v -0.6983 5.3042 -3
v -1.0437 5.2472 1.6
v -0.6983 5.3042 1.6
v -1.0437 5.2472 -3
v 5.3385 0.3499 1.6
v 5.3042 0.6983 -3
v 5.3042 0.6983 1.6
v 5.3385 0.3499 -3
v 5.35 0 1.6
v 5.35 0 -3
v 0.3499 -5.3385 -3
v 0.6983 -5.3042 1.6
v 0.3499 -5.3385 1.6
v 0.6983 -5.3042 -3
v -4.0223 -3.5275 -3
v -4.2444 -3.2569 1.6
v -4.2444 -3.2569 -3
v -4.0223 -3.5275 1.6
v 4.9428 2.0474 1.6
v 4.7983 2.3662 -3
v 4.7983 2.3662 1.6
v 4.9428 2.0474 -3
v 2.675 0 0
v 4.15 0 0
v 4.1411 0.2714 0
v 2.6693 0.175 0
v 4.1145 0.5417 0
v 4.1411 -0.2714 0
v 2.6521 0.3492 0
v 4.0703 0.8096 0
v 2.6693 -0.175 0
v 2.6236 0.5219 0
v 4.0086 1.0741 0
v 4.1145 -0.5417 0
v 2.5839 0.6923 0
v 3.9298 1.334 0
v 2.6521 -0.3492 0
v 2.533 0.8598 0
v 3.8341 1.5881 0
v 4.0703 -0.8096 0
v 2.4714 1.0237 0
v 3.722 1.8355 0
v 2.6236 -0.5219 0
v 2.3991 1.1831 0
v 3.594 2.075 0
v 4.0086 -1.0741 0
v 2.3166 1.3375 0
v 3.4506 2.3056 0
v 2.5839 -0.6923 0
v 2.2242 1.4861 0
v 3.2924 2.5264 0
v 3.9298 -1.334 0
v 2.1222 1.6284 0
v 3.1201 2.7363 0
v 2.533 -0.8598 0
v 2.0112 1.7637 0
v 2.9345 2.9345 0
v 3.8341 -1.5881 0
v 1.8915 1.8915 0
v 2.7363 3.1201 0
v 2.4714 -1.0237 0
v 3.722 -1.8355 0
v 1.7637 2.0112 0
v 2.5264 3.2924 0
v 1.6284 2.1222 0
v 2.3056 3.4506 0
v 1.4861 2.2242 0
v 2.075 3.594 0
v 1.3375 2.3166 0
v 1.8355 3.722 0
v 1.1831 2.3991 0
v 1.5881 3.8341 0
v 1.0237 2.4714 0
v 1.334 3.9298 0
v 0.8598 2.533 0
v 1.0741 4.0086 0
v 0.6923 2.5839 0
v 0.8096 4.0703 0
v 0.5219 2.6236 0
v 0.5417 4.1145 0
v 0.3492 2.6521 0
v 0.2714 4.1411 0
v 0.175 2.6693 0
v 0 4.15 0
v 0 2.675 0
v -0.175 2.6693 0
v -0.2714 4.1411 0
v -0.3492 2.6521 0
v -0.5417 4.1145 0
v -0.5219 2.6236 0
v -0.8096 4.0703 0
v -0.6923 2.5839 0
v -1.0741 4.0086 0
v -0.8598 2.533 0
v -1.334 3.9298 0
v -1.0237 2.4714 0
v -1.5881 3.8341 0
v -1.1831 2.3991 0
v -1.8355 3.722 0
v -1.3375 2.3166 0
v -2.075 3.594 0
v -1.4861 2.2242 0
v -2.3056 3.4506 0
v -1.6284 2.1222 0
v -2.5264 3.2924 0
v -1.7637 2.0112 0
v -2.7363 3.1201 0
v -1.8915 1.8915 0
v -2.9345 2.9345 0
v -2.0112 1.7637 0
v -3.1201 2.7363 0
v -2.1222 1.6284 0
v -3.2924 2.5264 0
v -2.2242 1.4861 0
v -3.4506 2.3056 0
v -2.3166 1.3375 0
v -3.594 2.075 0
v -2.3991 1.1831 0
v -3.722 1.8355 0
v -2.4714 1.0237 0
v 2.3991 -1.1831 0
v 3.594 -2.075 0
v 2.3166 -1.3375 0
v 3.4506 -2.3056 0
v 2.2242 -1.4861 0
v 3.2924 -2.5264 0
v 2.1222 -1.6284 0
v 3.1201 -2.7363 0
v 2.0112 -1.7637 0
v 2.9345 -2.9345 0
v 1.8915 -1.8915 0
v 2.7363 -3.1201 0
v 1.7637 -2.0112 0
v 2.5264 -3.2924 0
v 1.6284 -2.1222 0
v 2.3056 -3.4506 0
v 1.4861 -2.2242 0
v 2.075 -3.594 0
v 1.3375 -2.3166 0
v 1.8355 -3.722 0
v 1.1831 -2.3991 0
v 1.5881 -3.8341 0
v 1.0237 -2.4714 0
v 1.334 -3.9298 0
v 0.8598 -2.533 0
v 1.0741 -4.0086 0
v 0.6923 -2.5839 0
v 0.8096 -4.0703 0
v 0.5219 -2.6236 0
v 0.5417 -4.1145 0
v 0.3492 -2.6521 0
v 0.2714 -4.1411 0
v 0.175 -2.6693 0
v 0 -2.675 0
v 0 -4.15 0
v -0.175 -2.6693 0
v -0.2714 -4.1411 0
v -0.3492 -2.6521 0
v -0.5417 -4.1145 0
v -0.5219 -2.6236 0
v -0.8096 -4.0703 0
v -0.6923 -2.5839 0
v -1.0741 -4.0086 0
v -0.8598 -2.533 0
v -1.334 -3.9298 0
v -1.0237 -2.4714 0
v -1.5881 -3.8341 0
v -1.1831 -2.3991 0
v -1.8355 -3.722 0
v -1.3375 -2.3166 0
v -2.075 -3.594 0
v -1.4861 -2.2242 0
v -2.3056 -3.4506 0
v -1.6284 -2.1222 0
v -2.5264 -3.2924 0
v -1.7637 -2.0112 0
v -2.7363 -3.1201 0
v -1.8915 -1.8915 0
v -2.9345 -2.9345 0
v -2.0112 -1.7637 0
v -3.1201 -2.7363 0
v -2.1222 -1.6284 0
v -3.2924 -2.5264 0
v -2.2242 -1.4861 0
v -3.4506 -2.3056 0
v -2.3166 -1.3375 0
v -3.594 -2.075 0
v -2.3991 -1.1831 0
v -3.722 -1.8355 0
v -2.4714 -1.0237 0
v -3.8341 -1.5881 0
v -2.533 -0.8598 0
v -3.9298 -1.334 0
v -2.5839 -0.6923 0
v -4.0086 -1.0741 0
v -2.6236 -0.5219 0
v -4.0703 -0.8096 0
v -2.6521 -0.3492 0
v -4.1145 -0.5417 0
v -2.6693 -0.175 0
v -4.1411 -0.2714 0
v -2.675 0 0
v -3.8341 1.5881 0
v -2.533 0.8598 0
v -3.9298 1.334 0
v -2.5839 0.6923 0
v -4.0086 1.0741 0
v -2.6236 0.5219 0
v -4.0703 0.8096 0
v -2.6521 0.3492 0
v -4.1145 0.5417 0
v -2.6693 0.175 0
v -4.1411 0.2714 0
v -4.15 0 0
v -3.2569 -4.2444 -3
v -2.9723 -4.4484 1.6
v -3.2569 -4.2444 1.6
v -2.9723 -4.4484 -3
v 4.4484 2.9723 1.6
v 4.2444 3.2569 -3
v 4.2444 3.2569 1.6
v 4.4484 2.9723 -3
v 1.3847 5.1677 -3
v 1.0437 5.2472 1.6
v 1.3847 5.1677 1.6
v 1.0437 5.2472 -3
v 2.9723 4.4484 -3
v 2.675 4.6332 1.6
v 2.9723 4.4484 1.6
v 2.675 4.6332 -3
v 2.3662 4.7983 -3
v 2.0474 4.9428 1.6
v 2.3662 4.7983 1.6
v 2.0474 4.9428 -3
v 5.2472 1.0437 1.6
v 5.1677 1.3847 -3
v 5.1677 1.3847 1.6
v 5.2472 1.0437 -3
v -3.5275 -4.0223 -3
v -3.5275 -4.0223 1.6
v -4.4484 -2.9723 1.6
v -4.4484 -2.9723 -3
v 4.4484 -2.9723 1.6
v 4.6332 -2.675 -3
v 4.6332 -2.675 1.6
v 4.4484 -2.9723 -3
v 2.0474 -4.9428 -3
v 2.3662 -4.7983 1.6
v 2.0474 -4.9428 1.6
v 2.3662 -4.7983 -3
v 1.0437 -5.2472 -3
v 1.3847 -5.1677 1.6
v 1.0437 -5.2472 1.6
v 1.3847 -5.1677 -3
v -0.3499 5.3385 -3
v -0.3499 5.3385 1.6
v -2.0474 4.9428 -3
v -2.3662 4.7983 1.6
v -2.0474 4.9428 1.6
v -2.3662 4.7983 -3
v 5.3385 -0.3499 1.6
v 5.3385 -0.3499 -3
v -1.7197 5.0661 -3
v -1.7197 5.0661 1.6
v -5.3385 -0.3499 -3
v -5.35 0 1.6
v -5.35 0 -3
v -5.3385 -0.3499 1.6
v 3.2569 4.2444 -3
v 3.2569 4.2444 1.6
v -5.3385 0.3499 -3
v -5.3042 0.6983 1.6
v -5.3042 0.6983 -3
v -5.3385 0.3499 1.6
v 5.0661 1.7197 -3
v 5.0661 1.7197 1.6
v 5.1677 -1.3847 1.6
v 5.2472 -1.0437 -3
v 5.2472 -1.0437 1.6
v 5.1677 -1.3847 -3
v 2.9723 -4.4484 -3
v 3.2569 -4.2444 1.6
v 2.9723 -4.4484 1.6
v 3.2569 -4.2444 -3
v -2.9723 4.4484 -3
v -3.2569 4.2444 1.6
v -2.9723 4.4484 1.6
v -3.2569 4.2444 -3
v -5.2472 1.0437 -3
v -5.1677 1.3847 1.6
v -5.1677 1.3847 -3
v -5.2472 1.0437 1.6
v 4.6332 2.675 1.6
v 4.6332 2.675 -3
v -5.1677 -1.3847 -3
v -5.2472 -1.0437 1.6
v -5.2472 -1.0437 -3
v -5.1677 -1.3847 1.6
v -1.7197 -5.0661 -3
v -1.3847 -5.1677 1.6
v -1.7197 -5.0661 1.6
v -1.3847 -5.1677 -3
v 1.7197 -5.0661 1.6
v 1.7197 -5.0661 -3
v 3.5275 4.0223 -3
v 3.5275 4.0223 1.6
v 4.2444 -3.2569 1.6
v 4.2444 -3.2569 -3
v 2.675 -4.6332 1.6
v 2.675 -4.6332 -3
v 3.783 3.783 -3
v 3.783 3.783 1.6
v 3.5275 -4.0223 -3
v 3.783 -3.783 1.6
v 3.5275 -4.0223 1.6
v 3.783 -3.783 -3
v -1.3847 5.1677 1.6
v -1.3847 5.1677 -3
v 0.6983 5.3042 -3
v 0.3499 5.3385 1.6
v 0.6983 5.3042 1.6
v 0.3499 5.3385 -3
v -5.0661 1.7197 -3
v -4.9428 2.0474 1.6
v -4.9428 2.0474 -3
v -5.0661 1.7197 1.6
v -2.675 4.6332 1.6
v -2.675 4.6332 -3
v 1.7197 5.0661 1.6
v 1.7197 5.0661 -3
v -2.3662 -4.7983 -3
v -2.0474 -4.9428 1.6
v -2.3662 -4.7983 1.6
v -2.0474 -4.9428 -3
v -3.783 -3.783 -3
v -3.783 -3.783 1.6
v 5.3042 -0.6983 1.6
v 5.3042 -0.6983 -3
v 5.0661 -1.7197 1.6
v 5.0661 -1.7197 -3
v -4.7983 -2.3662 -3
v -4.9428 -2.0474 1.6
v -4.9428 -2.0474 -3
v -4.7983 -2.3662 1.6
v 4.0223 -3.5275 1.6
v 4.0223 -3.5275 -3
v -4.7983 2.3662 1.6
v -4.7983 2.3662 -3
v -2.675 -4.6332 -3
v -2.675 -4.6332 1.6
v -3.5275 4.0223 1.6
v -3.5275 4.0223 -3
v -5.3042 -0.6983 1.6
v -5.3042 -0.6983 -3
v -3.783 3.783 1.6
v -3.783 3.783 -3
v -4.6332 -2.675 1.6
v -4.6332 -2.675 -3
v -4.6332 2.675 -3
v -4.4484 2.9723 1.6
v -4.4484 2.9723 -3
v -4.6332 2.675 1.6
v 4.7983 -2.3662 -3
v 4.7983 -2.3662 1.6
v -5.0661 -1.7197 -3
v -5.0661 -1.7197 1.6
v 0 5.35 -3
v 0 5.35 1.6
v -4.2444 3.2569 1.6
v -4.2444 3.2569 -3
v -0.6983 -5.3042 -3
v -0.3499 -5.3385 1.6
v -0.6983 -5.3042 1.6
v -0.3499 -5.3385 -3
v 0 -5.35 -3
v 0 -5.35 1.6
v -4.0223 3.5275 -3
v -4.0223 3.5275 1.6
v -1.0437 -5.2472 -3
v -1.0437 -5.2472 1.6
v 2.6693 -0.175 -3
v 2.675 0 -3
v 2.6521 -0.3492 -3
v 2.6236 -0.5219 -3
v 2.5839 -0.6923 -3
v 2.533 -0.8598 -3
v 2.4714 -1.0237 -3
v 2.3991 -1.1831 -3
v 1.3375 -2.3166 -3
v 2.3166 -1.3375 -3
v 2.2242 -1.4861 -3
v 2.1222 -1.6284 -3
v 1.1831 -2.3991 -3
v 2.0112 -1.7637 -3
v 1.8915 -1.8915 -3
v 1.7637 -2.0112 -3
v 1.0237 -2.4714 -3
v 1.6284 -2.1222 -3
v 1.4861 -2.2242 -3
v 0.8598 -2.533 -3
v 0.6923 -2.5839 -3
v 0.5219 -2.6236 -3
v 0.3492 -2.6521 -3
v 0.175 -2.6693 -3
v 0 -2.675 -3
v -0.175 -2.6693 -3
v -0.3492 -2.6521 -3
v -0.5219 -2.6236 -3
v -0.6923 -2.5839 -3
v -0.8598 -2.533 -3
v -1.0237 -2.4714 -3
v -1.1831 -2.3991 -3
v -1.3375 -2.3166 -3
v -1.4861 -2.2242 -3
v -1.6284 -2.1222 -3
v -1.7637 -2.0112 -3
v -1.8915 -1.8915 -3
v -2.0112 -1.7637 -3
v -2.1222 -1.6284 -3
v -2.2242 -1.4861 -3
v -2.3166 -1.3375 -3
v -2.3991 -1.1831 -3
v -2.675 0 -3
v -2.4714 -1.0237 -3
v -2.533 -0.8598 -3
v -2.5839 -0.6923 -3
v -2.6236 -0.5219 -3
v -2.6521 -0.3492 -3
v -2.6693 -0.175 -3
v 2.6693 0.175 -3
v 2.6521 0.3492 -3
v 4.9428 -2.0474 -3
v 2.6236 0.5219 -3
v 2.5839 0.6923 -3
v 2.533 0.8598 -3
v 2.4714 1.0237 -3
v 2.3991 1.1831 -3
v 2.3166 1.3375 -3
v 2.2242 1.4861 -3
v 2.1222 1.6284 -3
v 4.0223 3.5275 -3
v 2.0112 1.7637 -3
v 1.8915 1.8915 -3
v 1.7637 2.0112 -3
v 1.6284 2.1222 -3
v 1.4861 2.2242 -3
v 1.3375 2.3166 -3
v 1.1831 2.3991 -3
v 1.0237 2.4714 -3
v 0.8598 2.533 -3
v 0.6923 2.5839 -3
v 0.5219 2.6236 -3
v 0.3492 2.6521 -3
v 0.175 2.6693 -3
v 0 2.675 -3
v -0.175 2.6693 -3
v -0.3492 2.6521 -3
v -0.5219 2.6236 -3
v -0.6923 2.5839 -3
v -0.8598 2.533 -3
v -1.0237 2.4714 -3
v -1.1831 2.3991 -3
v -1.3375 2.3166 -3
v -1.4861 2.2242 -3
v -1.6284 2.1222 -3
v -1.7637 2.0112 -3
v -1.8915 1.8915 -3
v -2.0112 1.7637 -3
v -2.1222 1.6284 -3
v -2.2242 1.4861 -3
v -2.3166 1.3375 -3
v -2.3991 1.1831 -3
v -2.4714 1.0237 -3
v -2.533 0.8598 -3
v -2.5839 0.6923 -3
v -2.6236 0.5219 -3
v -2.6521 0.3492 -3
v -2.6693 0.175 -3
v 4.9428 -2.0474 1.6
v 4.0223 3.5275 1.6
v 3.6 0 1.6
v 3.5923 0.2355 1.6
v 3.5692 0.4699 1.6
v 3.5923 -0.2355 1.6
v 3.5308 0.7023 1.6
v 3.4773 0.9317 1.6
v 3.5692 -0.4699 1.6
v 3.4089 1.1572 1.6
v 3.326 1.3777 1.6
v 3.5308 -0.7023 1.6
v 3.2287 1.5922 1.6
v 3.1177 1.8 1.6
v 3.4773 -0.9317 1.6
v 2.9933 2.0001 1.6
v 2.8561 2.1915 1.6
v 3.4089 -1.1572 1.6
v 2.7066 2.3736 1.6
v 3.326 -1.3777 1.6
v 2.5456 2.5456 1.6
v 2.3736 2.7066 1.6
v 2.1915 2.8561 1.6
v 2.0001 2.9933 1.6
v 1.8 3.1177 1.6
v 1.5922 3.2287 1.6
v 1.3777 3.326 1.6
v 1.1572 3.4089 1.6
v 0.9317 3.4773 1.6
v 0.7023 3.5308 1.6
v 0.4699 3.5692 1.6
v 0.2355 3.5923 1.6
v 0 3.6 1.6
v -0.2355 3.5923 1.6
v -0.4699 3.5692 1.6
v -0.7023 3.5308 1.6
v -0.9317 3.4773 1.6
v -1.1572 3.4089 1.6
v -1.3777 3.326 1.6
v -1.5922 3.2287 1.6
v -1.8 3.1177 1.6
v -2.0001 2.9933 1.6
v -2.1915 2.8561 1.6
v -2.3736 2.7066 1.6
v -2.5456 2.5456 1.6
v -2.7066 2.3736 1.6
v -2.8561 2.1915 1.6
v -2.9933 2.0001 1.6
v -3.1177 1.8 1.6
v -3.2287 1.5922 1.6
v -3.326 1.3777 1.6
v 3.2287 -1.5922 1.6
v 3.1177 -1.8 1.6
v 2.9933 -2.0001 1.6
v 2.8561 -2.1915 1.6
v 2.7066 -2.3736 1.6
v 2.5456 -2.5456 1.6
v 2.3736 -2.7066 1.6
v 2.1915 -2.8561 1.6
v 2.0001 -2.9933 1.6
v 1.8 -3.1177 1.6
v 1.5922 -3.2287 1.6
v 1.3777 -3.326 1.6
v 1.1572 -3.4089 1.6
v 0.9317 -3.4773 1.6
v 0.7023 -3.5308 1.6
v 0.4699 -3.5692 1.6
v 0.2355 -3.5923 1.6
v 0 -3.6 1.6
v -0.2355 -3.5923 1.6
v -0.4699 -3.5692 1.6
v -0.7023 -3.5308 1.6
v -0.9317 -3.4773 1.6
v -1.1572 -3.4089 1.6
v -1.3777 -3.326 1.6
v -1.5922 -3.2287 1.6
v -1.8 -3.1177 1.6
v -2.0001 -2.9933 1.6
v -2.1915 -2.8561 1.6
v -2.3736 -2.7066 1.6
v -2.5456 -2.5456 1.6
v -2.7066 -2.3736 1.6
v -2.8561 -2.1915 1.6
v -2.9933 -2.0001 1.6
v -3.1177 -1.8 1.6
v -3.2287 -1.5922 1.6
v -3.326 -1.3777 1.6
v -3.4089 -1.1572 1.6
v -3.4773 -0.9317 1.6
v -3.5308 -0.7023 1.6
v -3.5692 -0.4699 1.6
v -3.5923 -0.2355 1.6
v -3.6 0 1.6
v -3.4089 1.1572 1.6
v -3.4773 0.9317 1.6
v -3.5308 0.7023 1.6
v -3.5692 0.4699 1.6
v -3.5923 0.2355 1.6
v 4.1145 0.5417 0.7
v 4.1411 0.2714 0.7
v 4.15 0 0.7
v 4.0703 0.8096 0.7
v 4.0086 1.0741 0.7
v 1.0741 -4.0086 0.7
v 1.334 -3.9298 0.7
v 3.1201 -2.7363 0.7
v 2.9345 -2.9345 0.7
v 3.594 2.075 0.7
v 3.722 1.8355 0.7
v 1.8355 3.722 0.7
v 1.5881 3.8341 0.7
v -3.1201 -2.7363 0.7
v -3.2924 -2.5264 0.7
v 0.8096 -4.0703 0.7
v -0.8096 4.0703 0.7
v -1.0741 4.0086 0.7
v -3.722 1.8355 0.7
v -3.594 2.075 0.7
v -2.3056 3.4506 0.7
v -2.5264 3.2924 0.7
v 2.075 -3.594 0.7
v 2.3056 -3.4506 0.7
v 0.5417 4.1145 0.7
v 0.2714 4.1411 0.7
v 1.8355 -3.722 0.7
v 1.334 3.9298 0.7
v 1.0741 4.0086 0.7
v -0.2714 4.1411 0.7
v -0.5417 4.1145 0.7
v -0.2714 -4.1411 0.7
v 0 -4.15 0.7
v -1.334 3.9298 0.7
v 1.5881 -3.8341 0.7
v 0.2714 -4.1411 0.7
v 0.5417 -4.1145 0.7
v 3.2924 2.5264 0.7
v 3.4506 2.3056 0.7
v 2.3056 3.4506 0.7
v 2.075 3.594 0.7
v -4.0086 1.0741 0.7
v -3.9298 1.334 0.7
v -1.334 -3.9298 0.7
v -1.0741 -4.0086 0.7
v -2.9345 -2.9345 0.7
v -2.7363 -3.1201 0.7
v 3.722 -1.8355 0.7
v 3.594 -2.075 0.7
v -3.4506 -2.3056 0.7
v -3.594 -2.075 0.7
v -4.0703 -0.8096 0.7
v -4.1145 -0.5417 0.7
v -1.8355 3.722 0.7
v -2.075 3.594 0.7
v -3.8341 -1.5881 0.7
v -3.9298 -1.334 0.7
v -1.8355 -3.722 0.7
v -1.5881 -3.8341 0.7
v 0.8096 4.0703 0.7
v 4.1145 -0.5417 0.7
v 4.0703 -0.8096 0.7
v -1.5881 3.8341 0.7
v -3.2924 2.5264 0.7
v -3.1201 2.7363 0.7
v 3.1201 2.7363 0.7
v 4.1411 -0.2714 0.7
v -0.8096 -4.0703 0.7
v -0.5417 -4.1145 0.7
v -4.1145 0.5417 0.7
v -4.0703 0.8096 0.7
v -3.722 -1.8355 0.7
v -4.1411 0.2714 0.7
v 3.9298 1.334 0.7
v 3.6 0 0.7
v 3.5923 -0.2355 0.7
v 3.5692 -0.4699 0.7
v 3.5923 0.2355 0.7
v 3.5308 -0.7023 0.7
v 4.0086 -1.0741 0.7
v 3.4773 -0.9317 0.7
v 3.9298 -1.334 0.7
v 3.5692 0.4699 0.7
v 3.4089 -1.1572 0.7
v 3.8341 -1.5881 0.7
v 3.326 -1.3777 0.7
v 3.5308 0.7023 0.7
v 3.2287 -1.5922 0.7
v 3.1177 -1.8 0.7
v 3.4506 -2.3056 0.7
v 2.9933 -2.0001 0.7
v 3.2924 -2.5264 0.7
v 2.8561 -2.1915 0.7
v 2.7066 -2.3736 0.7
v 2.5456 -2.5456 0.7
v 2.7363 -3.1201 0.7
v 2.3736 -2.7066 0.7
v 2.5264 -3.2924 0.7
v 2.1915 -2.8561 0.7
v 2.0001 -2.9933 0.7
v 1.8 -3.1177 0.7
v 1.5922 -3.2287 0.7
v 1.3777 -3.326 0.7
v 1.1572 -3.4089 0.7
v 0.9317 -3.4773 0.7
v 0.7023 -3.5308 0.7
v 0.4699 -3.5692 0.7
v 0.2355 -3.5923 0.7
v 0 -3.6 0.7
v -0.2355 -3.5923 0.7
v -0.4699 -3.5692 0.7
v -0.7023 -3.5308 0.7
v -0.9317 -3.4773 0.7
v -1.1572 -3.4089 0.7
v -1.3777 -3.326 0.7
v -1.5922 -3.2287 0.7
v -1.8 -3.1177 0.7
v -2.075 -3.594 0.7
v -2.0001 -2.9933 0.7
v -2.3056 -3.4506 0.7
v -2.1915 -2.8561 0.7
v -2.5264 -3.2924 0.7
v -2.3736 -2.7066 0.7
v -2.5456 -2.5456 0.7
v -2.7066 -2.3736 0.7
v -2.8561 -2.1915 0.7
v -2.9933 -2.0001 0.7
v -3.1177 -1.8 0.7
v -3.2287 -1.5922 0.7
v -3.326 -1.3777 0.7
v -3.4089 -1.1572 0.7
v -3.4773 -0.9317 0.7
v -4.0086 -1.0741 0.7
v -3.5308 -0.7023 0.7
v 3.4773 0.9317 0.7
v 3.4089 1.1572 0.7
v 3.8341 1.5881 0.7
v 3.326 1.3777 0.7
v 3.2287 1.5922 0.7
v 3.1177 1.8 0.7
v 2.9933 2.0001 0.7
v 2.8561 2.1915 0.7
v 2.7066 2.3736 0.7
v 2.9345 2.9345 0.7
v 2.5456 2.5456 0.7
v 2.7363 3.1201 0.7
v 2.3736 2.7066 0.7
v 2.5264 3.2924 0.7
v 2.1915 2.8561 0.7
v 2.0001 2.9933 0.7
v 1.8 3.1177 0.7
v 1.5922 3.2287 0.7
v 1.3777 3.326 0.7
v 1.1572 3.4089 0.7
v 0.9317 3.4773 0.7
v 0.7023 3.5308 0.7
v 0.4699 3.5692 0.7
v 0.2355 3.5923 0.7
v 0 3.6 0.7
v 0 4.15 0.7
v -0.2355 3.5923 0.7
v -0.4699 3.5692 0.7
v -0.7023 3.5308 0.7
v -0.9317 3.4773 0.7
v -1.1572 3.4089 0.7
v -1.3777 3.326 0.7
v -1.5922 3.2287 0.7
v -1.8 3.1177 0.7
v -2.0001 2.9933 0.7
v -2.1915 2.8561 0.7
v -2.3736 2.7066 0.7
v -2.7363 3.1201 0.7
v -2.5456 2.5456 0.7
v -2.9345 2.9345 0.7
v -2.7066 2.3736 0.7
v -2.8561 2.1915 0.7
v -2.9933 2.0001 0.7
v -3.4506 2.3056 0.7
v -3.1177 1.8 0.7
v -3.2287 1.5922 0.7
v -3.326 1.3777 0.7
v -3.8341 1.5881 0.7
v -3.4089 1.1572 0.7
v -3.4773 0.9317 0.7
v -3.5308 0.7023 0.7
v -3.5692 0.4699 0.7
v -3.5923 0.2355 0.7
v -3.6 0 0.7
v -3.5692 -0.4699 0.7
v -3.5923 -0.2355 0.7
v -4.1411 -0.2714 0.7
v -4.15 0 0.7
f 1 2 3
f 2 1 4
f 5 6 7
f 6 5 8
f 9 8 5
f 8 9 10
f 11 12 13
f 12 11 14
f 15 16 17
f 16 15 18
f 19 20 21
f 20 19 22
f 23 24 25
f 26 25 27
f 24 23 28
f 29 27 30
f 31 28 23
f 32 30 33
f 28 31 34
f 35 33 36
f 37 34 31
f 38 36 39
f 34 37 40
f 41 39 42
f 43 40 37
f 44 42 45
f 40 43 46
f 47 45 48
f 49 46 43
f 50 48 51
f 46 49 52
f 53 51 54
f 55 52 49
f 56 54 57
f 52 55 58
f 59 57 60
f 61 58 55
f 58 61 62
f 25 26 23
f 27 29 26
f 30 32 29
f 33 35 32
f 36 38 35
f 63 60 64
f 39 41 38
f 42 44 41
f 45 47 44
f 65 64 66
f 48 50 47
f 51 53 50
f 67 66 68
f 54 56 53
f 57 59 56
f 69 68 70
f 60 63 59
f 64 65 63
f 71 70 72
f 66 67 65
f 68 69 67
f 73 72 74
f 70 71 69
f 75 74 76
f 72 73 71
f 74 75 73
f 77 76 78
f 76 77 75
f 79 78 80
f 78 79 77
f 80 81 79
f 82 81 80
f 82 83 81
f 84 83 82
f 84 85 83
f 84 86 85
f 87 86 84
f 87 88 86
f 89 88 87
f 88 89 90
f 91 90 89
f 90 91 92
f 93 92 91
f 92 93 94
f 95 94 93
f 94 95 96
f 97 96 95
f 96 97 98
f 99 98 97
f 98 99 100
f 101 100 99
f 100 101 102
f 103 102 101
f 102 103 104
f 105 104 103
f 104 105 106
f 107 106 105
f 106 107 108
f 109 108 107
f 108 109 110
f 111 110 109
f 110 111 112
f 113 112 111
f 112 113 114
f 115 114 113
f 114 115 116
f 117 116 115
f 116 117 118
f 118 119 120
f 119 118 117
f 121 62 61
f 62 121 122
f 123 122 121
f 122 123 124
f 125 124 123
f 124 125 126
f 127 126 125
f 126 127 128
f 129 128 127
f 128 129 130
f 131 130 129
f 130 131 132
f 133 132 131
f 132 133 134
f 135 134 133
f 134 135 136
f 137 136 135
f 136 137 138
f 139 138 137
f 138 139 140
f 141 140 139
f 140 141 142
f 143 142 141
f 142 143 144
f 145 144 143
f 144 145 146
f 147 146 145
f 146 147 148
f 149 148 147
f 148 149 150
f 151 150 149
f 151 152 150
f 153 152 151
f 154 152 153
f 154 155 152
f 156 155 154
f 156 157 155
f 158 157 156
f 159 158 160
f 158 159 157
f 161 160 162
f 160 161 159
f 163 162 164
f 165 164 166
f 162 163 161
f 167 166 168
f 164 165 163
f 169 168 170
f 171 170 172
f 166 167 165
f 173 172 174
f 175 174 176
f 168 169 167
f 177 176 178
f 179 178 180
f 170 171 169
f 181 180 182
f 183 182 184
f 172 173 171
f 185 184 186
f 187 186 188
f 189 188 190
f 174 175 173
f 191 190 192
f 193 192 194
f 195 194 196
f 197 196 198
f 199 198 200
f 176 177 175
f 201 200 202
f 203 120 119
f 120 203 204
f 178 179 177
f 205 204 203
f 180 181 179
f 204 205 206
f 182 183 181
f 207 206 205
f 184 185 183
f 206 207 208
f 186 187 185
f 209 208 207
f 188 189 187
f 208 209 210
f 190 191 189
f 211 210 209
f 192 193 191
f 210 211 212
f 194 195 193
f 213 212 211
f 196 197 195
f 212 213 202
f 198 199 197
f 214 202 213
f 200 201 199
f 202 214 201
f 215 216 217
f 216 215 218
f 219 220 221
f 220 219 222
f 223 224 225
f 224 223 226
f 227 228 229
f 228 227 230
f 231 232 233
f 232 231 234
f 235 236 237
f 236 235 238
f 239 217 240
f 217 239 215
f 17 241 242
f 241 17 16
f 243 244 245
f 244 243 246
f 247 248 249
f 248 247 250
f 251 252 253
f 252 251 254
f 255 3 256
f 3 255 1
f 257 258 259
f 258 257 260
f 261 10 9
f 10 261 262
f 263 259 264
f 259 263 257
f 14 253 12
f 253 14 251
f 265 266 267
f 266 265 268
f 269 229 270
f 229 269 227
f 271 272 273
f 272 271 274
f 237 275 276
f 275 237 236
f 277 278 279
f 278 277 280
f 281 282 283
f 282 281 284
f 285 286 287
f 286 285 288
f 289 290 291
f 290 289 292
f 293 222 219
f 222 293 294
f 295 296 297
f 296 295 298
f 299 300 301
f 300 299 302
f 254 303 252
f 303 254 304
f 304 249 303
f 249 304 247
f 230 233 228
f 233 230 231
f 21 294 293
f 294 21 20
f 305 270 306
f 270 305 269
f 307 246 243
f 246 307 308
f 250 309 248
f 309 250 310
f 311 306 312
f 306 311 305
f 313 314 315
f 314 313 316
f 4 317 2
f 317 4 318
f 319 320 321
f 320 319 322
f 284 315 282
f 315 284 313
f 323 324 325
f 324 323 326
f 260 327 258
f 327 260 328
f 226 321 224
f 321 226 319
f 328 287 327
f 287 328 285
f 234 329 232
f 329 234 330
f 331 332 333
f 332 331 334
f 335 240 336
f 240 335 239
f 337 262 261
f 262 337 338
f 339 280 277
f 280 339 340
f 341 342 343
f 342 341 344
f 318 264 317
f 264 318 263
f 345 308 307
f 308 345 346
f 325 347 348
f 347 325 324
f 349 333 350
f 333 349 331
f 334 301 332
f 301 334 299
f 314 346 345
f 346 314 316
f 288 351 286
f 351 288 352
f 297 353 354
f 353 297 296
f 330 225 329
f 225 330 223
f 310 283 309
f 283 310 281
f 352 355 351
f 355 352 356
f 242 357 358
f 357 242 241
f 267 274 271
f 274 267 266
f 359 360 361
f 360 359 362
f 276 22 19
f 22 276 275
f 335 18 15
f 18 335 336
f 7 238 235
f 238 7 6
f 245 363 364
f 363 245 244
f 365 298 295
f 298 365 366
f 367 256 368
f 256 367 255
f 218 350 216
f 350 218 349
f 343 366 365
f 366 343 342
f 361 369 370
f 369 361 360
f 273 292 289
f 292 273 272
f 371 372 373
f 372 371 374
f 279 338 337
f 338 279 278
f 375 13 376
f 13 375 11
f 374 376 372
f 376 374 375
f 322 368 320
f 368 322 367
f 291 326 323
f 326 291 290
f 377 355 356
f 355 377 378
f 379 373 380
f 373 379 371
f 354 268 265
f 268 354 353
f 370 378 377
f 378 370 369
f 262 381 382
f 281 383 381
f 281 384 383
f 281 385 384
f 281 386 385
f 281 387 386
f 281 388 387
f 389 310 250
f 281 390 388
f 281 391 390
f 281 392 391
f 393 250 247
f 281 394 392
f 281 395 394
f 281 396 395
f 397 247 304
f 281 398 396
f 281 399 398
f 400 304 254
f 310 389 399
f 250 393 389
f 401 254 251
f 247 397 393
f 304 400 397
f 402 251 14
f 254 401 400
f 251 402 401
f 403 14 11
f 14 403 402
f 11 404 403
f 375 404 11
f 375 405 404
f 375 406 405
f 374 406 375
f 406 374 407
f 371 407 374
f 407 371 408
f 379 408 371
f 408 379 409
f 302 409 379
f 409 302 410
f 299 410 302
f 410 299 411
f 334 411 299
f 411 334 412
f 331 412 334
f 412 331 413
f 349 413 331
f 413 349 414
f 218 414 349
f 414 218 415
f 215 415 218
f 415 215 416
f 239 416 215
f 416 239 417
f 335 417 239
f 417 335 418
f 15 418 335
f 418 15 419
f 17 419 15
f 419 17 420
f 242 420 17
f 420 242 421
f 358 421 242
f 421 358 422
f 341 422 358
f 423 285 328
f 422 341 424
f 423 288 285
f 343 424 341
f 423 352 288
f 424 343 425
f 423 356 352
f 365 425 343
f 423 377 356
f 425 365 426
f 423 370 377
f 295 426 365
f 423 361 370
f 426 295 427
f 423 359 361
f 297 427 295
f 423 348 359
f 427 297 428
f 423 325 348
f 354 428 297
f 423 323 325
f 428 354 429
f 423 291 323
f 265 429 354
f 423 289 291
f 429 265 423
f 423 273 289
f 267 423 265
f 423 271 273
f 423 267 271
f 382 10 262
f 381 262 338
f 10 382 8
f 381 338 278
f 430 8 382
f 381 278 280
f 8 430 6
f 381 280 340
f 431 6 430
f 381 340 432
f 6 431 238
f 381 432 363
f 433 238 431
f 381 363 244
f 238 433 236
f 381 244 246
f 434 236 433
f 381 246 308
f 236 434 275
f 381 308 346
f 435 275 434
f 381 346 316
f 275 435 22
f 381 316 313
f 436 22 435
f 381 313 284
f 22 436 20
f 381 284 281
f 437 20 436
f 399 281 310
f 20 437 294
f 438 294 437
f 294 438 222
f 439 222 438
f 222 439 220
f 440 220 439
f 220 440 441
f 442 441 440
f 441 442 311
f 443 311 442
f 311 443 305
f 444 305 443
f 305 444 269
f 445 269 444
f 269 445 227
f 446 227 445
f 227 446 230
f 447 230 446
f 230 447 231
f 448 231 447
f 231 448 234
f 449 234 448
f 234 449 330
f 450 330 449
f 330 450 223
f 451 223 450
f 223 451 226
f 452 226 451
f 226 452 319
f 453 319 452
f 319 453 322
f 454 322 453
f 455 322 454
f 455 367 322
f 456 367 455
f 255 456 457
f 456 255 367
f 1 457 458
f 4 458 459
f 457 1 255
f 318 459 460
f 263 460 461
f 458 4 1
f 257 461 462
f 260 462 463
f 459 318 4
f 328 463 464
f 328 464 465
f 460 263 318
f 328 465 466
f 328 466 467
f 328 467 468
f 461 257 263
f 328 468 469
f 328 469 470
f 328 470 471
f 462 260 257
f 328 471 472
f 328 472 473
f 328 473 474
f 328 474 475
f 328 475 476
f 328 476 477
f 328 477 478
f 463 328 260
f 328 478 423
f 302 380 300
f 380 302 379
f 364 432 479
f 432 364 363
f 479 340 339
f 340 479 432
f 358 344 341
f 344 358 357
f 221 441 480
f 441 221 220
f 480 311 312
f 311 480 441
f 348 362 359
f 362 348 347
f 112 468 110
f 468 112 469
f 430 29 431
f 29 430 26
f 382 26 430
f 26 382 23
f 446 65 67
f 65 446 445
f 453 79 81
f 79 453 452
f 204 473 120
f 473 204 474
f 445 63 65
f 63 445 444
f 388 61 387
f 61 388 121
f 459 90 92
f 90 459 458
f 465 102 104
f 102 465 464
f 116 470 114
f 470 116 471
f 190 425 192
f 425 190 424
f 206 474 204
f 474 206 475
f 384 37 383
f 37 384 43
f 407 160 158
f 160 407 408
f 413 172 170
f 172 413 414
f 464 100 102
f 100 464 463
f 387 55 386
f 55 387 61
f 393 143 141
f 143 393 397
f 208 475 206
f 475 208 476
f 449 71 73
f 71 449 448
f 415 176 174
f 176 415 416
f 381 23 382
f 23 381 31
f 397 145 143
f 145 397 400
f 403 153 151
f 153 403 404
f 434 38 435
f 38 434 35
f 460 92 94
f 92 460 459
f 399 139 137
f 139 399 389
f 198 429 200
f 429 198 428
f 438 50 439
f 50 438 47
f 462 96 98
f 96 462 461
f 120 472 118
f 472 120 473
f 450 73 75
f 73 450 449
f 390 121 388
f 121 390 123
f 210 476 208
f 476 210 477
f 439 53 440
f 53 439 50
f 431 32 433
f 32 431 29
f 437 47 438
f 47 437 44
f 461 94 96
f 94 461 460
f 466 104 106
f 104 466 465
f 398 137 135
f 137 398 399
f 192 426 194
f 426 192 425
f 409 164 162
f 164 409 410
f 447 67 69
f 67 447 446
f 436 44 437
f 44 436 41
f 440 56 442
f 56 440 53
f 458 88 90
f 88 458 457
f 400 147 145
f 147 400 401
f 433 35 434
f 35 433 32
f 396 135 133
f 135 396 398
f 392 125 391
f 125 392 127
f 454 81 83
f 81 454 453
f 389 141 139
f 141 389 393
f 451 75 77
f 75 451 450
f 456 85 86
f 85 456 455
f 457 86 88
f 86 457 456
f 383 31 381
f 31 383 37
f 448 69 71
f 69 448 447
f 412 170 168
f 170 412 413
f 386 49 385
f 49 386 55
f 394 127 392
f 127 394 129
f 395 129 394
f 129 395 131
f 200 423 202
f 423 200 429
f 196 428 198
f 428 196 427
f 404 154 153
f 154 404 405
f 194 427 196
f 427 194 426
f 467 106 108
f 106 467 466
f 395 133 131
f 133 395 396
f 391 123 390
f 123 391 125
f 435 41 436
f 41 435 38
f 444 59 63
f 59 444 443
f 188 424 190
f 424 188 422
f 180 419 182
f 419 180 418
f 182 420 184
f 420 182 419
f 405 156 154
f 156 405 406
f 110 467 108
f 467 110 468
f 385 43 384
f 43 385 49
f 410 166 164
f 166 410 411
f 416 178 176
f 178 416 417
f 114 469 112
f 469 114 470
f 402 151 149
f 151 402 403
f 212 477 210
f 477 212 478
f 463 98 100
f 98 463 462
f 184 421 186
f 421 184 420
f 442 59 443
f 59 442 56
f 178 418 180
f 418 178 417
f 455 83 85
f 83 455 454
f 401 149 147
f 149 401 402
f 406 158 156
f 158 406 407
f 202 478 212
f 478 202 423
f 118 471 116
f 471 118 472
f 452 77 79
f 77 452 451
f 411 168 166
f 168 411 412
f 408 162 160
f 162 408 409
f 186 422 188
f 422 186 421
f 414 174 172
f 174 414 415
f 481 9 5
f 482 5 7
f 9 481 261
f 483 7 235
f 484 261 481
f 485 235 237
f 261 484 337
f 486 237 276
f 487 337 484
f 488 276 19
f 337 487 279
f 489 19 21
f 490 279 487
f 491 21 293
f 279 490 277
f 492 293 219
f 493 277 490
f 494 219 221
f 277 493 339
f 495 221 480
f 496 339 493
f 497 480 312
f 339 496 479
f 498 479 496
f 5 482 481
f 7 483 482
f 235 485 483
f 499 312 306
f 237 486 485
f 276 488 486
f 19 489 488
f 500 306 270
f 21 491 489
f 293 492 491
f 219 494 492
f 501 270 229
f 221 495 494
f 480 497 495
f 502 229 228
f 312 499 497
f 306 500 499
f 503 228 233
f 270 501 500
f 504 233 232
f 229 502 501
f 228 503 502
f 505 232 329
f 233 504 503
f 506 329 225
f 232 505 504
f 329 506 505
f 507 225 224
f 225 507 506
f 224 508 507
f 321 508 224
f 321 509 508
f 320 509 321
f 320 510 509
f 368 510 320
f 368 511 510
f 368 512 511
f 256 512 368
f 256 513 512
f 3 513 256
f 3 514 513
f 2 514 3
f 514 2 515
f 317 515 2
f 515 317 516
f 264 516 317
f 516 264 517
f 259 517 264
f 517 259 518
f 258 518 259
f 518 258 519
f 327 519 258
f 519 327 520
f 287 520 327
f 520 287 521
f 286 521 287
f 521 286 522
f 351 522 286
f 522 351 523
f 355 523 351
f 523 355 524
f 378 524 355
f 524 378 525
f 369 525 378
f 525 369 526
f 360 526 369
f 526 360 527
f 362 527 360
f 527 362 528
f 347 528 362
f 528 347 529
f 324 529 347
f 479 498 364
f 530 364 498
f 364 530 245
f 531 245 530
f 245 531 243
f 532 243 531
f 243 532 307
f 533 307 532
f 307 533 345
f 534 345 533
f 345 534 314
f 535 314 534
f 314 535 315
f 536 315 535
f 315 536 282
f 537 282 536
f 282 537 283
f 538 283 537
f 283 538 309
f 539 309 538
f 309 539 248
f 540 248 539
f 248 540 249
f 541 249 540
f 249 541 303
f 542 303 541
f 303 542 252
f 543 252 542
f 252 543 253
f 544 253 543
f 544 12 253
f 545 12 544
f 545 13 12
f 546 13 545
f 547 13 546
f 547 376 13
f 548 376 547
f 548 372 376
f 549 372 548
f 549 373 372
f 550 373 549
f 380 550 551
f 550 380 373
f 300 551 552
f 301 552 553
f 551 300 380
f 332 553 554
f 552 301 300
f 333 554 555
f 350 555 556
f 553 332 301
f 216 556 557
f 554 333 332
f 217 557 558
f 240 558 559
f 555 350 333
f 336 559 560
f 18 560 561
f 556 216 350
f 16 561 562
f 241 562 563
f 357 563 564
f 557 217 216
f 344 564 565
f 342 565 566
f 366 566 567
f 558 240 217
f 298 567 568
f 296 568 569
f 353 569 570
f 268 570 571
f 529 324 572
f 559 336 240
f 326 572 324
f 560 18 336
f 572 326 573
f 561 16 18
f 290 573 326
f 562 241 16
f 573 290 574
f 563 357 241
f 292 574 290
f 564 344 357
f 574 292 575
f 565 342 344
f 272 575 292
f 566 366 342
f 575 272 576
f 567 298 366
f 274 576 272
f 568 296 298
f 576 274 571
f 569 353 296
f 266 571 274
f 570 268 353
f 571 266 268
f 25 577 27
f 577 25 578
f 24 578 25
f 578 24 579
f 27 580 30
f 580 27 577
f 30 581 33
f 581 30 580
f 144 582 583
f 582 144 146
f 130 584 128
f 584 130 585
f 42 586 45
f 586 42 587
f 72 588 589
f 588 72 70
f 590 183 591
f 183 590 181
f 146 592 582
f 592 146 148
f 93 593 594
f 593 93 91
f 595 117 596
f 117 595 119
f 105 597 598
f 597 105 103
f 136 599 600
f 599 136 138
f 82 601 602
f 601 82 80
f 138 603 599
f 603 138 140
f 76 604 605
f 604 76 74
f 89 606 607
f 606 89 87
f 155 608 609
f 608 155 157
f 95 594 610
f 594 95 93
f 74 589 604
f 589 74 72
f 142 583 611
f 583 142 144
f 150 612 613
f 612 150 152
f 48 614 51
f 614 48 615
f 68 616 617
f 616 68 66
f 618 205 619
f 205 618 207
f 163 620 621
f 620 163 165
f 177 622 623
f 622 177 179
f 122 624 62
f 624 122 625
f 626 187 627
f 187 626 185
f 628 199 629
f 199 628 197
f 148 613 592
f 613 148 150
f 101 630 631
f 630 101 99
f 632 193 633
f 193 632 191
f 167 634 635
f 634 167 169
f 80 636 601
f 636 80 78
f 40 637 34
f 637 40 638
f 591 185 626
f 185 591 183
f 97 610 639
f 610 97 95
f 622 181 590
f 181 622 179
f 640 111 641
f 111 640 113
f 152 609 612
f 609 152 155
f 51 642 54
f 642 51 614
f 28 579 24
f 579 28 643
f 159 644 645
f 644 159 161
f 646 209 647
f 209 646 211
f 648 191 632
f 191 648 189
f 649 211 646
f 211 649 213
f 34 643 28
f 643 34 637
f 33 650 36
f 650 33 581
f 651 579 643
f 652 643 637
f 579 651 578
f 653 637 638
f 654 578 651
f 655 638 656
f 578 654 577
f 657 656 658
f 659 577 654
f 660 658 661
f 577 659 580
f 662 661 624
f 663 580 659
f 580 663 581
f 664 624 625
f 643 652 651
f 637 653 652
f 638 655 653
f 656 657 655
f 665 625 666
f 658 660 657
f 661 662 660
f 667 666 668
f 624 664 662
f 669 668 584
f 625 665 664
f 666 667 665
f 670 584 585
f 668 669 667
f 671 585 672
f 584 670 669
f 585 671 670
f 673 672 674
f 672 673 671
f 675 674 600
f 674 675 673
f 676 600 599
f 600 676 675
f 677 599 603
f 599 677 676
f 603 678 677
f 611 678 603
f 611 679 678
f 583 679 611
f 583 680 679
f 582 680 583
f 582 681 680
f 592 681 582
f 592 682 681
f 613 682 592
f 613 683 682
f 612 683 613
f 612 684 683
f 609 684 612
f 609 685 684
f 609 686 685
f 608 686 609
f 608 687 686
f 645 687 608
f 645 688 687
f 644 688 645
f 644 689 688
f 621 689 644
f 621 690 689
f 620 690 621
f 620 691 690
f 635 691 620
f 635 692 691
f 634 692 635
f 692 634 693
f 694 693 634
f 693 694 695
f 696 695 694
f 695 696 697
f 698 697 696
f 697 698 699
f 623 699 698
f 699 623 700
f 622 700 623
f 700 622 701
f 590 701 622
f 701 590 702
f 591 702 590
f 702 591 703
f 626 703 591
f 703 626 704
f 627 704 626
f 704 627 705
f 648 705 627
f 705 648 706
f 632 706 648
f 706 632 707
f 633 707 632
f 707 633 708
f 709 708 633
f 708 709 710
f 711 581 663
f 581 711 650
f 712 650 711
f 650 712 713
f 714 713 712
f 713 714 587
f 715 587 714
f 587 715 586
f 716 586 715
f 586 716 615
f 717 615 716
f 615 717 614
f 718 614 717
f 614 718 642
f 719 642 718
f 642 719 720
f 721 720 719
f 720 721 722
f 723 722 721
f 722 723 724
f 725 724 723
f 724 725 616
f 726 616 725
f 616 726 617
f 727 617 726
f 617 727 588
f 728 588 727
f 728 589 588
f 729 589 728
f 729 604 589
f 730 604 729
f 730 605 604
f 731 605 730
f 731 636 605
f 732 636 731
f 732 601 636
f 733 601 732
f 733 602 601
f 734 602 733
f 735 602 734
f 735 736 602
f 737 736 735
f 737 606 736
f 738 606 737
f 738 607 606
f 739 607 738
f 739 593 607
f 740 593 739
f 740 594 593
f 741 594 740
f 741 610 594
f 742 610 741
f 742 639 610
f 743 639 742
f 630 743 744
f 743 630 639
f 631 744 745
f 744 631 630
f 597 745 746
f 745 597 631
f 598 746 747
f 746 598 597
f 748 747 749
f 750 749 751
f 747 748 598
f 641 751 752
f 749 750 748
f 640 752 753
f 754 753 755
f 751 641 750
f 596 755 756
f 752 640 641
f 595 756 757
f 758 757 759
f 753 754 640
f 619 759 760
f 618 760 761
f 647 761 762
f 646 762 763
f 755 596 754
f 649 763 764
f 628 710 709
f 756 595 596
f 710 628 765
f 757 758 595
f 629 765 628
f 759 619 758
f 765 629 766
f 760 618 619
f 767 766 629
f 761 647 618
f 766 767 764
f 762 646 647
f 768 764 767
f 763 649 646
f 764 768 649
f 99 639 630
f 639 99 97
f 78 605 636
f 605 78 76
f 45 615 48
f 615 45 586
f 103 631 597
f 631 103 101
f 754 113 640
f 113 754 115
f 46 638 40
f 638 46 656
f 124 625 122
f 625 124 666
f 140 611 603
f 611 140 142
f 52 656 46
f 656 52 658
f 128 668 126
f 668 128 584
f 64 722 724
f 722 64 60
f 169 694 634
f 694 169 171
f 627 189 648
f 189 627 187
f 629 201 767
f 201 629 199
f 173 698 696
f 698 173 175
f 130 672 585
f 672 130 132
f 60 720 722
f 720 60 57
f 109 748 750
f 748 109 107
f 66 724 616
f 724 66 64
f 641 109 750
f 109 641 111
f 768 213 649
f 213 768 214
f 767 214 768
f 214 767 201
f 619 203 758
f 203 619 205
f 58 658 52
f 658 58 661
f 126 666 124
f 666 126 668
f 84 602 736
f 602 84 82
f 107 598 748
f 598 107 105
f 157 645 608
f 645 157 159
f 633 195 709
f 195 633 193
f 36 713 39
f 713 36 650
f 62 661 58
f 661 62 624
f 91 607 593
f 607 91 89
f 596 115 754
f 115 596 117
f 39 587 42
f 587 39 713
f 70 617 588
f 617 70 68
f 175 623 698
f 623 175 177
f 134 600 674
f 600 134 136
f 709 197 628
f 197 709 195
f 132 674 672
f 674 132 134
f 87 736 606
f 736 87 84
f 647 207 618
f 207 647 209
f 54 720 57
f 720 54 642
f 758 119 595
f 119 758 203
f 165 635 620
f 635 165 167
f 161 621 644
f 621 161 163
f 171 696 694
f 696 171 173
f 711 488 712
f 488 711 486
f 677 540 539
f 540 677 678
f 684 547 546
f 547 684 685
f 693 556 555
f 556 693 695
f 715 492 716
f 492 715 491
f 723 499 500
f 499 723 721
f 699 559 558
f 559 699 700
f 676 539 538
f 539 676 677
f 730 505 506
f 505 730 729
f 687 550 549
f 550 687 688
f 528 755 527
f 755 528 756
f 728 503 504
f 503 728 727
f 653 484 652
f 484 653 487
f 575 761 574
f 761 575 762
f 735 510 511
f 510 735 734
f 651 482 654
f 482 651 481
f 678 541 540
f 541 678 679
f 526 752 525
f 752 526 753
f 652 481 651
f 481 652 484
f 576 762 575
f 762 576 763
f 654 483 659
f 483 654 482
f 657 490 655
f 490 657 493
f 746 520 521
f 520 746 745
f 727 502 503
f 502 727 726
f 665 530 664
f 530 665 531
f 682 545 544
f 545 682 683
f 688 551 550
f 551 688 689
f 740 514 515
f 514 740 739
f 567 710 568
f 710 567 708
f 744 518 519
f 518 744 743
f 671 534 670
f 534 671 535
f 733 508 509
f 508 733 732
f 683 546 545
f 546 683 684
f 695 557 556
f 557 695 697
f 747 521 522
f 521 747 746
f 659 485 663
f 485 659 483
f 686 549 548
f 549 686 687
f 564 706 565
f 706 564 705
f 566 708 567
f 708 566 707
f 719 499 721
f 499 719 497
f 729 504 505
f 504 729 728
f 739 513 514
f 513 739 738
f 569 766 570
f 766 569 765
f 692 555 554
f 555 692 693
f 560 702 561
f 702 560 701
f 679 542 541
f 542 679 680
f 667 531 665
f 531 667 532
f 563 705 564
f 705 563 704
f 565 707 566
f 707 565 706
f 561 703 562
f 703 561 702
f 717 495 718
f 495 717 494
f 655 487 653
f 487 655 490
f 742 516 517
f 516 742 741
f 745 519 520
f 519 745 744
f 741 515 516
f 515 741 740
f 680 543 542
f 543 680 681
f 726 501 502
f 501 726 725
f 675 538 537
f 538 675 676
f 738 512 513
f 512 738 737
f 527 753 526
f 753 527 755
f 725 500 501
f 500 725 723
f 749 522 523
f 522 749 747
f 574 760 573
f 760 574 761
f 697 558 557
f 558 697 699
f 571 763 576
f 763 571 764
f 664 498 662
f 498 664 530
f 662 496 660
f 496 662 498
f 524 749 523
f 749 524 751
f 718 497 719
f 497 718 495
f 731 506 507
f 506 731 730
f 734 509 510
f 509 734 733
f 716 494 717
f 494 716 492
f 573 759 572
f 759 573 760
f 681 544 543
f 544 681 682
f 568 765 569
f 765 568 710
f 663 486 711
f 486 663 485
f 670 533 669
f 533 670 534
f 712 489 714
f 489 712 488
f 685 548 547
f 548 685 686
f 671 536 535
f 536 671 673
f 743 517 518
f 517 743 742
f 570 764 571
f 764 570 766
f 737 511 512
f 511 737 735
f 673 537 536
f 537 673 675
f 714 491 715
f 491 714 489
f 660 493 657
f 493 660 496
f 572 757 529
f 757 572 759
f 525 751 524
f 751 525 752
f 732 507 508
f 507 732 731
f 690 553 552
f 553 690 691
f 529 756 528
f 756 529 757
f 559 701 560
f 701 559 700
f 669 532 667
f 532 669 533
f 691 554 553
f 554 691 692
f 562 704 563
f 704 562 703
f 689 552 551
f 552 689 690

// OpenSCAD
// AE4901 5-mm GL5537-1 educational test-cap -- GENERATIVE PARAMETRIC CAD
// Optical face is nominally z=0, top aperture at z=mask_depth_mm.
// Geometry is a simplified opaque circular opening; no claim of optical qualification.
// Print rotated 180 degrees (aperture roof on print bed); dark/opaque matte material.
// Verify actual LDR case diameter with calipers and adjust clearance before assembly.
// Use: openscad -o mask.stl -D 'mask_depth_mm=0.6' -D 'aperture_radius_mm=3.6' ldr_mask_parametric.scad
$fn=96;
part = "mask"; // mask | bare
mask_depth_mm=0.6; // z=0 is top of photosensitive disk
aperture_radius_mm=3.6;
aperture_offset_mm=0.0; // offset along x; experimental directional mask
recess_width_mm=4.15; // radius of open optical cavity behind aperture roof
lid_thickness_mm=1.0;
case_radius_mm=2.675; // adjust for actual 5-mm LDR diameter, clearance included
case_depth_mm=3.0;
outer_radius_mm=5.35;

module base_collar(){
 difference(){
  translate([0,0,-case_depth_mm]) cylinder(r=outer_radius_mm,h=case_depth_mm);
  translate([0,0,-case_depth_mm-0.1]) cylinder(r=case_radius_mm,h=case_depth_mm+0.2);
 }
}
module optical_roof(){
 difference(){
  union(){
   cylinder(r=outer_radius_mm,h=mask_depth_mm+lid_thickness_mm);
  }
  // cavity extends from detector plane until underside of top aperture roof
  translate([0,0,-0.1]) cylinder(r=recess_width_mm,h=mask_depth_mm+0.2);
  // opening placed above recessed cavity, optionally offset in x
  translate([aperture_offset_mm,0,mask_depth_mm-0.01])
     cylinder(r=aperture_radius_mm,h=lid_thickness_mm+0.1);
 }
}
if(part=="bare") base_collar();
else union(){base_collar();optical_roof();}
